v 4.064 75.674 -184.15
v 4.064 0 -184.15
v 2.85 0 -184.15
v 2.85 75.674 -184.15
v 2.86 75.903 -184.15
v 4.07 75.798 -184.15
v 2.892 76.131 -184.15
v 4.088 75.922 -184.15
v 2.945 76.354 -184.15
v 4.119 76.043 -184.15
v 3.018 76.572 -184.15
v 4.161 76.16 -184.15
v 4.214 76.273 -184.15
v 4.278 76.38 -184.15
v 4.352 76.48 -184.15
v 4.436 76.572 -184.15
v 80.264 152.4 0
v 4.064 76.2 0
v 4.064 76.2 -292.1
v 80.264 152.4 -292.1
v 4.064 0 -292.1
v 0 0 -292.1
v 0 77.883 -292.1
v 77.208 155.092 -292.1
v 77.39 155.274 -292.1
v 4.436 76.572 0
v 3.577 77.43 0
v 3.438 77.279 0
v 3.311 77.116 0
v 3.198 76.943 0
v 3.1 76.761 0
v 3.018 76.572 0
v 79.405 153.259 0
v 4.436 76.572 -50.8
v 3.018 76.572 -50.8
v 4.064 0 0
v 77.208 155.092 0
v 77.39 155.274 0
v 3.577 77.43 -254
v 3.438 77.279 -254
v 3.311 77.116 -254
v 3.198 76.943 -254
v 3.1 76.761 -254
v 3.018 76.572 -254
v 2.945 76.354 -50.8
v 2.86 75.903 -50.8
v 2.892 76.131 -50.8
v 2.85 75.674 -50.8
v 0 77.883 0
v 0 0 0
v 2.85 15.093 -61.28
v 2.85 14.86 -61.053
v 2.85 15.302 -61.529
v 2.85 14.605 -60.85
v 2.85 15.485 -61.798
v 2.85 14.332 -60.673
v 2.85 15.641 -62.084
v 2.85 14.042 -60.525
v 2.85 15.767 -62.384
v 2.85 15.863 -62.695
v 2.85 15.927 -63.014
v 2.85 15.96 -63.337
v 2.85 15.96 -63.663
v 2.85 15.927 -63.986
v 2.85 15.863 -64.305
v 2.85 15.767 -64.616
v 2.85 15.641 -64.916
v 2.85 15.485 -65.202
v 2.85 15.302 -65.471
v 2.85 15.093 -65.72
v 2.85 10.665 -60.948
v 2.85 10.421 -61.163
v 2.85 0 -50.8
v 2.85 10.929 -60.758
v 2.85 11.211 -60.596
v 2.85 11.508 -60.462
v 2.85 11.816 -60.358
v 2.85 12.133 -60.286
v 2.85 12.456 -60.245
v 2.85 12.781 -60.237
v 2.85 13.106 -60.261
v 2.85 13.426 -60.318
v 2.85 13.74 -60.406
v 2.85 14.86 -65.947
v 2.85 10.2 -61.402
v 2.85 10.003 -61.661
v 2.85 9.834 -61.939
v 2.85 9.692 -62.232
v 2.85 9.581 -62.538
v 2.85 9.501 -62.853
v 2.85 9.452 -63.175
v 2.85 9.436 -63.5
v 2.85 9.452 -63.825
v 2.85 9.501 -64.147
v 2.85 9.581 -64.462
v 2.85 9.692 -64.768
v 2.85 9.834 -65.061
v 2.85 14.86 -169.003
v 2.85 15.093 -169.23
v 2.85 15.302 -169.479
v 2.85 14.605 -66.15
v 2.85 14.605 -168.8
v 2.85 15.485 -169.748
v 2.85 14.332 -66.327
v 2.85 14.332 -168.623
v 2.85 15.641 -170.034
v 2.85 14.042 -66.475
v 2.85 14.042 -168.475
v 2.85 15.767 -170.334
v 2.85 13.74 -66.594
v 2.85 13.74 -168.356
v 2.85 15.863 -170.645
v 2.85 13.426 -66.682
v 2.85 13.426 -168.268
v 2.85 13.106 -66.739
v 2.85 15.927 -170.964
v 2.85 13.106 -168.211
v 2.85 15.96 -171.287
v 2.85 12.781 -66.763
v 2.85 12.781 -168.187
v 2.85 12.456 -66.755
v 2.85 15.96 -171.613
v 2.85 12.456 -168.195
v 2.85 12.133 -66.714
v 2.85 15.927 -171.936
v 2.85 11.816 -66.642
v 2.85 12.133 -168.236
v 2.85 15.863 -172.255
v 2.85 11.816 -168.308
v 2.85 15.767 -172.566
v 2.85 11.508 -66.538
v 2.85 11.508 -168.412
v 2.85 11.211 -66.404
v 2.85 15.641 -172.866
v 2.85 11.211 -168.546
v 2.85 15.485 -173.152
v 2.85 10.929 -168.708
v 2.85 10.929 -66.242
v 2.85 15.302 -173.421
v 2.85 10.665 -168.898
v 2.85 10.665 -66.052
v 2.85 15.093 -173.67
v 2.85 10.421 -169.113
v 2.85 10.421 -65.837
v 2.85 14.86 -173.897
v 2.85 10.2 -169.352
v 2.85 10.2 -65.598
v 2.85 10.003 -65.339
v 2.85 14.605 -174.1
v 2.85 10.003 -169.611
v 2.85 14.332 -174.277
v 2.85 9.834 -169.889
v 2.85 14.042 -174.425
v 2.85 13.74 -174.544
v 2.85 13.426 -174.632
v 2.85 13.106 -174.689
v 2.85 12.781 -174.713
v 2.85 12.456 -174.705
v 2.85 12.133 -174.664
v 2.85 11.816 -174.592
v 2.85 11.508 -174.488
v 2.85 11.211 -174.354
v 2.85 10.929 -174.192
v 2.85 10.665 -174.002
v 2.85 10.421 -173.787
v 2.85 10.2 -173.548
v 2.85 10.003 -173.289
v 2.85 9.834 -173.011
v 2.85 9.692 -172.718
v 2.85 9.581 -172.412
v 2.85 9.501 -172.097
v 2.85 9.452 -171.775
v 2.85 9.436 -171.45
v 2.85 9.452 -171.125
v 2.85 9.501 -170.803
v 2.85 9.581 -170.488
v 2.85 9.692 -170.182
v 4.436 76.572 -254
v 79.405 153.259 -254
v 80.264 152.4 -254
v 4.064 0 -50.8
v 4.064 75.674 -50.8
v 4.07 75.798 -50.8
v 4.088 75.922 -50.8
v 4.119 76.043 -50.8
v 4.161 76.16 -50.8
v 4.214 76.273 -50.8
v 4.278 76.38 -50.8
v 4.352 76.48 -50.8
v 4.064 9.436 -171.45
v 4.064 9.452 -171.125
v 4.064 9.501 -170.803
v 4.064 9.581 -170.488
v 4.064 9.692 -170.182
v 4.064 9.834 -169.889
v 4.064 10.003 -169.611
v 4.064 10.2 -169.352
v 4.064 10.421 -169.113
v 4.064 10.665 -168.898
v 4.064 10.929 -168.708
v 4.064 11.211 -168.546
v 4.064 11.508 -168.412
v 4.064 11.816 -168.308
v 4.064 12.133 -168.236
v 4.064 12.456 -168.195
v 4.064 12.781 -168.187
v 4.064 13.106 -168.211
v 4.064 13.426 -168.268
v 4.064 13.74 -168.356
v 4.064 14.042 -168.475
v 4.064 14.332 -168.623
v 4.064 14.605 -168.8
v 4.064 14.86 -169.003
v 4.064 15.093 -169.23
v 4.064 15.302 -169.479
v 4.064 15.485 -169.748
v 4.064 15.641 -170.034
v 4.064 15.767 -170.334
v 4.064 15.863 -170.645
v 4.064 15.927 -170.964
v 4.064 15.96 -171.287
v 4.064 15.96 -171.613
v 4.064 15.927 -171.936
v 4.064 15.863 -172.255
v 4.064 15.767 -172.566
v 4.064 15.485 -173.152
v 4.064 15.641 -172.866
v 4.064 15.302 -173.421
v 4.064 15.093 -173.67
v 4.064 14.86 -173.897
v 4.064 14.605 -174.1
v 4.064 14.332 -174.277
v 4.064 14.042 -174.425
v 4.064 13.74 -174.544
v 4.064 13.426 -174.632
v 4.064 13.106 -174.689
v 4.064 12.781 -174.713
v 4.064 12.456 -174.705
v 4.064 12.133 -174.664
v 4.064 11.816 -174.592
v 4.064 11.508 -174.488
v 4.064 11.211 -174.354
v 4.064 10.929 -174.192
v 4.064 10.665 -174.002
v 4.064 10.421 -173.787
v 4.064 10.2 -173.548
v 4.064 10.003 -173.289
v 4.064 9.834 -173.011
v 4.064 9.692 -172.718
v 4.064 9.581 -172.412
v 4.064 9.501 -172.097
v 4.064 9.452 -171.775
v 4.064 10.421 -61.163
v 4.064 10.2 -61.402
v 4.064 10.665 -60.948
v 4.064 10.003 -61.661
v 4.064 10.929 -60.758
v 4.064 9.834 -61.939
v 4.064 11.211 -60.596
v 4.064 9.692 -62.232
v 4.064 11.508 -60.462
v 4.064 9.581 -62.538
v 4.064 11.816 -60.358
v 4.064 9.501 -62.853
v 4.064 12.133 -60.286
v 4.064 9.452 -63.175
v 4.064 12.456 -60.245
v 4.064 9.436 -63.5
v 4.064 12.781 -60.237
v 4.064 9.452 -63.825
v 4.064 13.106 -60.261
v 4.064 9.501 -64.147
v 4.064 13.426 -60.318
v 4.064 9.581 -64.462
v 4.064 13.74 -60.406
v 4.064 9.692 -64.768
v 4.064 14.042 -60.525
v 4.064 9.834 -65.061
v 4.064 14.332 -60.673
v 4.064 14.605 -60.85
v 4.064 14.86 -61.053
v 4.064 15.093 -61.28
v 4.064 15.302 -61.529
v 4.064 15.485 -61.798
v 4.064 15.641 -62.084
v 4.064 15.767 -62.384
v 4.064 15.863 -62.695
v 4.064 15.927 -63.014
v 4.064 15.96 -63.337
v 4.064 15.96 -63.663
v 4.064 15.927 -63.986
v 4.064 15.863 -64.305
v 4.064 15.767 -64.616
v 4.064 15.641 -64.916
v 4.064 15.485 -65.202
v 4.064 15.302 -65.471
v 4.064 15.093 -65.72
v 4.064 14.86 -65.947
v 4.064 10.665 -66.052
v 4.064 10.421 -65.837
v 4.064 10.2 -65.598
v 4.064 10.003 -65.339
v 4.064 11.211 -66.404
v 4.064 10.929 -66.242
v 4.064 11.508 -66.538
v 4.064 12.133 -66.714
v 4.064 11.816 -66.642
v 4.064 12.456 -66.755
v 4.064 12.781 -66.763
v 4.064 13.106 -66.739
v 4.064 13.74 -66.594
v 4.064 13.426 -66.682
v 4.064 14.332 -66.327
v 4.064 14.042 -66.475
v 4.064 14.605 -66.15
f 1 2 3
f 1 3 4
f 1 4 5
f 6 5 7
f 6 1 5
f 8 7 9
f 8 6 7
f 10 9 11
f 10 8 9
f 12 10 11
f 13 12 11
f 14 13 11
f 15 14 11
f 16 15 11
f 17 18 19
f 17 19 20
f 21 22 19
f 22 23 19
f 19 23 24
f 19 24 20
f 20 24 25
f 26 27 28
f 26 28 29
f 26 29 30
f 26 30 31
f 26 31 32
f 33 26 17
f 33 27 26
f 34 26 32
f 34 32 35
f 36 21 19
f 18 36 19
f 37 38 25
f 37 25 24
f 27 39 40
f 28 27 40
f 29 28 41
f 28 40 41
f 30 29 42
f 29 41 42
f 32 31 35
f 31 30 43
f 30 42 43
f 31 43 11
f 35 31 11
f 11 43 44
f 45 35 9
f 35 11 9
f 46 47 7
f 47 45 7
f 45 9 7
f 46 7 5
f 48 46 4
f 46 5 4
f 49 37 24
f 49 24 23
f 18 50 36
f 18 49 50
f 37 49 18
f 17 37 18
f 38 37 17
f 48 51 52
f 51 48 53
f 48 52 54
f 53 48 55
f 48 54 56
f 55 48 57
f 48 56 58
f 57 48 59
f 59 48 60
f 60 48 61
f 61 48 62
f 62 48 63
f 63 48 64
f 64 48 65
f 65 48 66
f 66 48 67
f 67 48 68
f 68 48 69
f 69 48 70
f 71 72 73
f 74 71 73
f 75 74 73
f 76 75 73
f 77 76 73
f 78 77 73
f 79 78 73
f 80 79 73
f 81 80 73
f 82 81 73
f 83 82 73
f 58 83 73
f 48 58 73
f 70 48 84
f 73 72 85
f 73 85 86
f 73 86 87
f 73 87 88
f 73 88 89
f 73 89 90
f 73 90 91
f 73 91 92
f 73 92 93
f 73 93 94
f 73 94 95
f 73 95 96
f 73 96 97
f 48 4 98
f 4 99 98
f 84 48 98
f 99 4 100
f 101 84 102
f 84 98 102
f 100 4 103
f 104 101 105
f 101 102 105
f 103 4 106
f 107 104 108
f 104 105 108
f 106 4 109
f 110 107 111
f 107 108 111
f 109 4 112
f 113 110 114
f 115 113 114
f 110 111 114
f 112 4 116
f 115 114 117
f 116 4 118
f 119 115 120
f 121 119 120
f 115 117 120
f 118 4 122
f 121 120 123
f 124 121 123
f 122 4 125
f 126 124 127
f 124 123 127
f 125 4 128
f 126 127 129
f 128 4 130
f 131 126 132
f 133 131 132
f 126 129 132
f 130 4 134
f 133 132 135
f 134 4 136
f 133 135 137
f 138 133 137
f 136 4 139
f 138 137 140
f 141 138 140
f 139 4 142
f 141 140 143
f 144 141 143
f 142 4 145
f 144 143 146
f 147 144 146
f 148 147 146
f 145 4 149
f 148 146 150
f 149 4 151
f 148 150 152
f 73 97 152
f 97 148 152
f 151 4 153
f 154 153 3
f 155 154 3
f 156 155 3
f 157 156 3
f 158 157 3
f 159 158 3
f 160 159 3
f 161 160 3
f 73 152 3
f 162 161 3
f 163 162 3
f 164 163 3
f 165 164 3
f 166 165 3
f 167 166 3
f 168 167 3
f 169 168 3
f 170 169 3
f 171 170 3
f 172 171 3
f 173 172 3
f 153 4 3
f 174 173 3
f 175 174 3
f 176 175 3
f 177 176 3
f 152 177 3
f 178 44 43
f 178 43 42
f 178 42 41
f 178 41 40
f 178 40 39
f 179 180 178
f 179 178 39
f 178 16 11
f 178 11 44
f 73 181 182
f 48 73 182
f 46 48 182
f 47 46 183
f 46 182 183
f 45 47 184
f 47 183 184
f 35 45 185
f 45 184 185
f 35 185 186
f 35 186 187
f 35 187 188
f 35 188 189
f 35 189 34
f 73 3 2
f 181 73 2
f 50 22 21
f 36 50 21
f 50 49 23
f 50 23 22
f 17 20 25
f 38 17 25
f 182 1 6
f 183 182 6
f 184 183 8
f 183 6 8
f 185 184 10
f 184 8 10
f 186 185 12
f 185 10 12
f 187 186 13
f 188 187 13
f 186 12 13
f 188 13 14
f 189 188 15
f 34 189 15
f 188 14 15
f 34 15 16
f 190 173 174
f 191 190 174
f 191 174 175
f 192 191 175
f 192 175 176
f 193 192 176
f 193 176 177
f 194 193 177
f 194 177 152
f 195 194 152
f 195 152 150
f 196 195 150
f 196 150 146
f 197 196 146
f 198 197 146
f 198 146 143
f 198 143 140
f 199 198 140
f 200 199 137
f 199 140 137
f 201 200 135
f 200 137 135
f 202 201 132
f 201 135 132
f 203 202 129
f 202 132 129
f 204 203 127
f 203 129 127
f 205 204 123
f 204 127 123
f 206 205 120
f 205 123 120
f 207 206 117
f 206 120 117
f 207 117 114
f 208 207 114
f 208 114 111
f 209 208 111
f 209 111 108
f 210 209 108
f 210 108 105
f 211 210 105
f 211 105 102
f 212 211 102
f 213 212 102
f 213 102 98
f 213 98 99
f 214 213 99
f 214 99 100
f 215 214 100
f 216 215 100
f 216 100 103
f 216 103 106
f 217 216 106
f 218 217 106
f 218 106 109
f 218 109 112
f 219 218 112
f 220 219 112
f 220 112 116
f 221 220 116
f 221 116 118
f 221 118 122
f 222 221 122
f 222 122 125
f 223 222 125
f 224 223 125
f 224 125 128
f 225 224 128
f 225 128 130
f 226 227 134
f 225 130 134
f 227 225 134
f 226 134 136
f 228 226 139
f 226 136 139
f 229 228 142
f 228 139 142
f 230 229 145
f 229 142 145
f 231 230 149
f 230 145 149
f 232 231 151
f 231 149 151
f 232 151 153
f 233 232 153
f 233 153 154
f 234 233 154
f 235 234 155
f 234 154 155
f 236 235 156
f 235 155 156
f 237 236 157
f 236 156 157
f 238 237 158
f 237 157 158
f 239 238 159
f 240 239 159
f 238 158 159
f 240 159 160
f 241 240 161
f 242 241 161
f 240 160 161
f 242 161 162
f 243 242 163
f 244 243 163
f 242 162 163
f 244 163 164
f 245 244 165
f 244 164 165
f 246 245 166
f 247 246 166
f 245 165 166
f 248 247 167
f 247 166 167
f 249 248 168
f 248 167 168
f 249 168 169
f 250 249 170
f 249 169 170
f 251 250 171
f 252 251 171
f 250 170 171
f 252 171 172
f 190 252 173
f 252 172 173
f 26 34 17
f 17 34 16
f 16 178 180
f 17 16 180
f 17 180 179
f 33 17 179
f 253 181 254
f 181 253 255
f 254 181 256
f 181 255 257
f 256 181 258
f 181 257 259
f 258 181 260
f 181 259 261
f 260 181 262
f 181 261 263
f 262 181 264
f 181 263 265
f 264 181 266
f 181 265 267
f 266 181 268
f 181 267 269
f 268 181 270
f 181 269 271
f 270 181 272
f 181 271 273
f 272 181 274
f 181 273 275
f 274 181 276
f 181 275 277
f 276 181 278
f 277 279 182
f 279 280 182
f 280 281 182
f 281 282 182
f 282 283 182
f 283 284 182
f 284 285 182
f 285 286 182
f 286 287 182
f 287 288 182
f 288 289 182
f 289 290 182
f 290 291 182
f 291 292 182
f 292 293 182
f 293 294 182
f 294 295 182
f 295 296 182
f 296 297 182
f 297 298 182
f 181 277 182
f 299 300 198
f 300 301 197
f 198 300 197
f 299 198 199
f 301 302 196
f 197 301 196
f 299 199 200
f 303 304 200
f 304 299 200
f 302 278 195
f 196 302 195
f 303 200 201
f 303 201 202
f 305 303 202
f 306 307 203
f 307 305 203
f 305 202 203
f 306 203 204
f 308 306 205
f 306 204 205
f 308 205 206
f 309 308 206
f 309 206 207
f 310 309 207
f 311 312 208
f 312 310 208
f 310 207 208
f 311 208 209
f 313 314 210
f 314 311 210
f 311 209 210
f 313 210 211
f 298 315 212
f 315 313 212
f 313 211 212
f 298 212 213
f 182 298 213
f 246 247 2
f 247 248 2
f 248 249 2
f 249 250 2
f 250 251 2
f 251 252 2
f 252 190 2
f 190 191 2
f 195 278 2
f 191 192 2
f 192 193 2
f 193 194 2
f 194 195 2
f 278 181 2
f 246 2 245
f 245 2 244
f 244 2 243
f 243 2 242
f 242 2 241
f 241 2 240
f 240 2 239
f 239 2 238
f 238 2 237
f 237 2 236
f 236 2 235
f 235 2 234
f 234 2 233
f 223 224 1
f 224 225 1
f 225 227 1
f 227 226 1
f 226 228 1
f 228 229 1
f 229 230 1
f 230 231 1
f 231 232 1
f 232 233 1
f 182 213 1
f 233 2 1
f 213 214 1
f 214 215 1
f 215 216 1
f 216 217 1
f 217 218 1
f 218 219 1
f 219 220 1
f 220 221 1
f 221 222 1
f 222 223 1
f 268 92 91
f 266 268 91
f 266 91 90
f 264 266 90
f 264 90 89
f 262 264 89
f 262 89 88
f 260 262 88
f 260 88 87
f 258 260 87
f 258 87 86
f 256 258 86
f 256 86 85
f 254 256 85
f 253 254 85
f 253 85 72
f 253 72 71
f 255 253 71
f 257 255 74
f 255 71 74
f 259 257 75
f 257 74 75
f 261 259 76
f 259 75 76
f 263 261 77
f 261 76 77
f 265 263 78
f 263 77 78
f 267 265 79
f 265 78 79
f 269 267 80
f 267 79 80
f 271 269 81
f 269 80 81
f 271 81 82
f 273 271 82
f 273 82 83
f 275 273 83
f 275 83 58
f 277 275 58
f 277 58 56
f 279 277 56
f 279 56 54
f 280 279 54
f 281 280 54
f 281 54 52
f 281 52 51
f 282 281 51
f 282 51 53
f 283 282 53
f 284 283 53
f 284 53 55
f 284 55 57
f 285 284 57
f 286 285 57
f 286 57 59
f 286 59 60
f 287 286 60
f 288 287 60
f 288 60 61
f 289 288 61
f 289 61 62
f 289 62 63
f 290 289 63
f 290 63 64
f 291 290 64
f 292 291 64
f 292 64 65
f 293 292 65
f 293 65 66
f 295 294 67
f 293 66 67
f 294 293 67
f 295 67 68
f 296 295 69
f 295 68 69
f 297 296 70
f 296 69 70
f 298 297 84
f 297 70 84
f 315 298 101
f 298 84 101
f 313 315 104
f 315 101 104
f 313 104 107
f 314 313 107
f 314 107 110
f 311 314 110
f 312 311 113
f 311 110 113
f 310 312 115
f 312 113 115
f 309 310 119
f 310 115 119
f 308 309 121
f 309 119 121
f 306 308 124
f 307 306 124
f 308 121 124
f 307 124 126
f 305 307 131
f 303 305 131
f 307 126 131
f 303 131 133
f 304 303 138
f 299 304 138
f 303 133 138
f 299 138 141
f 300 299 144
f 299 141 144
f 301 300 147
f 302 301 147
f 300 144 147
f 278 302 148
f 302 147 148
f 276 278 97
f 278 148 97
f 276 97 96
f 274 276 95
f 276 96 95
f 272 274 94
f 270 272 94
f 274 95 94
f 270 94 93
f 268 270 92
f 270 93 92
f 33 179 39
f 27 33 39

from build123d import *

# Parameters (mm, degrees)
BOSS_EXTRUDE2_DEPTH  = 292.1
CONVERT_SOLID2_START = -292.1
CONVERT_SOLID2_DEPTH = 292.1
SKETCH12_W           = 50.8
SKETCH12_H           = 76.571974388
CUT_EXTRUDE1_DEPTH   = 292.1
SKETCH13_W           = 107.95
SKETCH13_H           = 76.571974388
CUT_EXTRUDE2_DEPTH   = 292.1
SKETCH14_R           = 3.2639
CUT_EXTRUDE3_DEPTH   = 292.1
SKETCH16_W           = 38.1
SKETCH16_H           = 76.686538097
CUT_EXTRUDE4_DEPTH   = 365.222577978


# Read off the part's stored shape, not the designer's step: Convert-Solid2
with BuildPart() as part:
    # Sketch7 → Boss-Extrude2 (new body)
    with BuildSketch(Plane.XY):
        Polygon((0, 0), (4.064, 0), (4.064, 76.2), (80.264, 152.4), (77.390318041, 155.273681959), (77.208487056, 155.091850973), (0, 77.883363917), align=None)
    extrude(amount=-BOSS_EXTRUDE2_DEPTH)


with BuildPart() as body_2:
    # Convert-Solid2 outline → Convert-Solid2 (new body)
    with BuildSketch(Plane.XY.offset(CONVERT_SOLID2_START)):
        with BuildLine():
            Line((2.84988, 0), (4.064, 0))
            Line((4.064, 0), (4.064, 75.673948776))
            ThreePointArc((4.064, 75.673948776), (4.160672994, 76.159956735), (4.435974388, 76.571974388))
            Line((4.435974388, 76.571974388), (80.264, 152.4))
            Line((80.264, 152.4), (79.405487515, 153.258512485))
            Line((79.405487515, 153.258512485), (3.577461903, 77.430486873))
            ThreePointArc((3.577461903, 77.430486873), (3.038972376, 76.624580344), (2.84988, 75.673948776))
            Line((2.84988, 75.673948776), (2.84988, 0))
        make_face()
    extrude(amount=CONVERT_SOLID2_DEPTH)

    # Sketch12 → Cut-Extrude1 (cut)
    with BuildSketch(Plane(origin=(152.4, 0, 0), x_dir=(0, 0, -1), z_dir=(1, 0, 0))):
        with Locations((25.4, 38.285987194)):
            Rectangle(SKETCH12_W, SKETCH12_H)
    extrude(amount=-CUT_EXTRUDE1_DEPTH, mode=Mode.SUBTRACT)

    # Sketch13 → Cut-Extrude2 (cut)
    with BuildSketch(Plane(origin=(152.4, 0, 0), x_dir=(0, 0, -1), z_dir=(1, 0, 0))):
        with Locations((238.125, 38.285987194)):
            Rectangle(SKETCH13_W, SKETCH13_H)
    extrude(amount=-CUT_EXTRUDE2_DEPTH, mode=Mode.SUBTRACT)

    # Sketch14 → Cut-Extrude3 (cut)
    with BuildSketch(Plane.ZY.offset(-2.84988)):
        with Locations(Location((-171.45, 12.7, 0), (0, 0, 270))):
            Circle(SKETCH14_R)
        with Locations(Location((-63.5, 12.7, 0), (0, 0, 270))):
            Circle(SKETCH14_R)
    extrude(amount=-CUT_EXTRUDE3_DEPTH, mode=Mode.SUBTRACT)

    # Sketch16 → Cut-Extrude4 (cut, through all)
    with BuildSketch(Plane(origin=(152.4, 0, 0), x_dir=(0, 0, -1), z_dir=(1, 0, 0))):
        with Locations((273.05, 114.915243437)):
            Rectangle(SKETCH16_W, SKETCH16_H)
    extrude(amount=-CUT_EXTRUDE4_DEPTH, mode=Mode.SUBTRACT)


solid = Compound([part.part, body_2.part])
